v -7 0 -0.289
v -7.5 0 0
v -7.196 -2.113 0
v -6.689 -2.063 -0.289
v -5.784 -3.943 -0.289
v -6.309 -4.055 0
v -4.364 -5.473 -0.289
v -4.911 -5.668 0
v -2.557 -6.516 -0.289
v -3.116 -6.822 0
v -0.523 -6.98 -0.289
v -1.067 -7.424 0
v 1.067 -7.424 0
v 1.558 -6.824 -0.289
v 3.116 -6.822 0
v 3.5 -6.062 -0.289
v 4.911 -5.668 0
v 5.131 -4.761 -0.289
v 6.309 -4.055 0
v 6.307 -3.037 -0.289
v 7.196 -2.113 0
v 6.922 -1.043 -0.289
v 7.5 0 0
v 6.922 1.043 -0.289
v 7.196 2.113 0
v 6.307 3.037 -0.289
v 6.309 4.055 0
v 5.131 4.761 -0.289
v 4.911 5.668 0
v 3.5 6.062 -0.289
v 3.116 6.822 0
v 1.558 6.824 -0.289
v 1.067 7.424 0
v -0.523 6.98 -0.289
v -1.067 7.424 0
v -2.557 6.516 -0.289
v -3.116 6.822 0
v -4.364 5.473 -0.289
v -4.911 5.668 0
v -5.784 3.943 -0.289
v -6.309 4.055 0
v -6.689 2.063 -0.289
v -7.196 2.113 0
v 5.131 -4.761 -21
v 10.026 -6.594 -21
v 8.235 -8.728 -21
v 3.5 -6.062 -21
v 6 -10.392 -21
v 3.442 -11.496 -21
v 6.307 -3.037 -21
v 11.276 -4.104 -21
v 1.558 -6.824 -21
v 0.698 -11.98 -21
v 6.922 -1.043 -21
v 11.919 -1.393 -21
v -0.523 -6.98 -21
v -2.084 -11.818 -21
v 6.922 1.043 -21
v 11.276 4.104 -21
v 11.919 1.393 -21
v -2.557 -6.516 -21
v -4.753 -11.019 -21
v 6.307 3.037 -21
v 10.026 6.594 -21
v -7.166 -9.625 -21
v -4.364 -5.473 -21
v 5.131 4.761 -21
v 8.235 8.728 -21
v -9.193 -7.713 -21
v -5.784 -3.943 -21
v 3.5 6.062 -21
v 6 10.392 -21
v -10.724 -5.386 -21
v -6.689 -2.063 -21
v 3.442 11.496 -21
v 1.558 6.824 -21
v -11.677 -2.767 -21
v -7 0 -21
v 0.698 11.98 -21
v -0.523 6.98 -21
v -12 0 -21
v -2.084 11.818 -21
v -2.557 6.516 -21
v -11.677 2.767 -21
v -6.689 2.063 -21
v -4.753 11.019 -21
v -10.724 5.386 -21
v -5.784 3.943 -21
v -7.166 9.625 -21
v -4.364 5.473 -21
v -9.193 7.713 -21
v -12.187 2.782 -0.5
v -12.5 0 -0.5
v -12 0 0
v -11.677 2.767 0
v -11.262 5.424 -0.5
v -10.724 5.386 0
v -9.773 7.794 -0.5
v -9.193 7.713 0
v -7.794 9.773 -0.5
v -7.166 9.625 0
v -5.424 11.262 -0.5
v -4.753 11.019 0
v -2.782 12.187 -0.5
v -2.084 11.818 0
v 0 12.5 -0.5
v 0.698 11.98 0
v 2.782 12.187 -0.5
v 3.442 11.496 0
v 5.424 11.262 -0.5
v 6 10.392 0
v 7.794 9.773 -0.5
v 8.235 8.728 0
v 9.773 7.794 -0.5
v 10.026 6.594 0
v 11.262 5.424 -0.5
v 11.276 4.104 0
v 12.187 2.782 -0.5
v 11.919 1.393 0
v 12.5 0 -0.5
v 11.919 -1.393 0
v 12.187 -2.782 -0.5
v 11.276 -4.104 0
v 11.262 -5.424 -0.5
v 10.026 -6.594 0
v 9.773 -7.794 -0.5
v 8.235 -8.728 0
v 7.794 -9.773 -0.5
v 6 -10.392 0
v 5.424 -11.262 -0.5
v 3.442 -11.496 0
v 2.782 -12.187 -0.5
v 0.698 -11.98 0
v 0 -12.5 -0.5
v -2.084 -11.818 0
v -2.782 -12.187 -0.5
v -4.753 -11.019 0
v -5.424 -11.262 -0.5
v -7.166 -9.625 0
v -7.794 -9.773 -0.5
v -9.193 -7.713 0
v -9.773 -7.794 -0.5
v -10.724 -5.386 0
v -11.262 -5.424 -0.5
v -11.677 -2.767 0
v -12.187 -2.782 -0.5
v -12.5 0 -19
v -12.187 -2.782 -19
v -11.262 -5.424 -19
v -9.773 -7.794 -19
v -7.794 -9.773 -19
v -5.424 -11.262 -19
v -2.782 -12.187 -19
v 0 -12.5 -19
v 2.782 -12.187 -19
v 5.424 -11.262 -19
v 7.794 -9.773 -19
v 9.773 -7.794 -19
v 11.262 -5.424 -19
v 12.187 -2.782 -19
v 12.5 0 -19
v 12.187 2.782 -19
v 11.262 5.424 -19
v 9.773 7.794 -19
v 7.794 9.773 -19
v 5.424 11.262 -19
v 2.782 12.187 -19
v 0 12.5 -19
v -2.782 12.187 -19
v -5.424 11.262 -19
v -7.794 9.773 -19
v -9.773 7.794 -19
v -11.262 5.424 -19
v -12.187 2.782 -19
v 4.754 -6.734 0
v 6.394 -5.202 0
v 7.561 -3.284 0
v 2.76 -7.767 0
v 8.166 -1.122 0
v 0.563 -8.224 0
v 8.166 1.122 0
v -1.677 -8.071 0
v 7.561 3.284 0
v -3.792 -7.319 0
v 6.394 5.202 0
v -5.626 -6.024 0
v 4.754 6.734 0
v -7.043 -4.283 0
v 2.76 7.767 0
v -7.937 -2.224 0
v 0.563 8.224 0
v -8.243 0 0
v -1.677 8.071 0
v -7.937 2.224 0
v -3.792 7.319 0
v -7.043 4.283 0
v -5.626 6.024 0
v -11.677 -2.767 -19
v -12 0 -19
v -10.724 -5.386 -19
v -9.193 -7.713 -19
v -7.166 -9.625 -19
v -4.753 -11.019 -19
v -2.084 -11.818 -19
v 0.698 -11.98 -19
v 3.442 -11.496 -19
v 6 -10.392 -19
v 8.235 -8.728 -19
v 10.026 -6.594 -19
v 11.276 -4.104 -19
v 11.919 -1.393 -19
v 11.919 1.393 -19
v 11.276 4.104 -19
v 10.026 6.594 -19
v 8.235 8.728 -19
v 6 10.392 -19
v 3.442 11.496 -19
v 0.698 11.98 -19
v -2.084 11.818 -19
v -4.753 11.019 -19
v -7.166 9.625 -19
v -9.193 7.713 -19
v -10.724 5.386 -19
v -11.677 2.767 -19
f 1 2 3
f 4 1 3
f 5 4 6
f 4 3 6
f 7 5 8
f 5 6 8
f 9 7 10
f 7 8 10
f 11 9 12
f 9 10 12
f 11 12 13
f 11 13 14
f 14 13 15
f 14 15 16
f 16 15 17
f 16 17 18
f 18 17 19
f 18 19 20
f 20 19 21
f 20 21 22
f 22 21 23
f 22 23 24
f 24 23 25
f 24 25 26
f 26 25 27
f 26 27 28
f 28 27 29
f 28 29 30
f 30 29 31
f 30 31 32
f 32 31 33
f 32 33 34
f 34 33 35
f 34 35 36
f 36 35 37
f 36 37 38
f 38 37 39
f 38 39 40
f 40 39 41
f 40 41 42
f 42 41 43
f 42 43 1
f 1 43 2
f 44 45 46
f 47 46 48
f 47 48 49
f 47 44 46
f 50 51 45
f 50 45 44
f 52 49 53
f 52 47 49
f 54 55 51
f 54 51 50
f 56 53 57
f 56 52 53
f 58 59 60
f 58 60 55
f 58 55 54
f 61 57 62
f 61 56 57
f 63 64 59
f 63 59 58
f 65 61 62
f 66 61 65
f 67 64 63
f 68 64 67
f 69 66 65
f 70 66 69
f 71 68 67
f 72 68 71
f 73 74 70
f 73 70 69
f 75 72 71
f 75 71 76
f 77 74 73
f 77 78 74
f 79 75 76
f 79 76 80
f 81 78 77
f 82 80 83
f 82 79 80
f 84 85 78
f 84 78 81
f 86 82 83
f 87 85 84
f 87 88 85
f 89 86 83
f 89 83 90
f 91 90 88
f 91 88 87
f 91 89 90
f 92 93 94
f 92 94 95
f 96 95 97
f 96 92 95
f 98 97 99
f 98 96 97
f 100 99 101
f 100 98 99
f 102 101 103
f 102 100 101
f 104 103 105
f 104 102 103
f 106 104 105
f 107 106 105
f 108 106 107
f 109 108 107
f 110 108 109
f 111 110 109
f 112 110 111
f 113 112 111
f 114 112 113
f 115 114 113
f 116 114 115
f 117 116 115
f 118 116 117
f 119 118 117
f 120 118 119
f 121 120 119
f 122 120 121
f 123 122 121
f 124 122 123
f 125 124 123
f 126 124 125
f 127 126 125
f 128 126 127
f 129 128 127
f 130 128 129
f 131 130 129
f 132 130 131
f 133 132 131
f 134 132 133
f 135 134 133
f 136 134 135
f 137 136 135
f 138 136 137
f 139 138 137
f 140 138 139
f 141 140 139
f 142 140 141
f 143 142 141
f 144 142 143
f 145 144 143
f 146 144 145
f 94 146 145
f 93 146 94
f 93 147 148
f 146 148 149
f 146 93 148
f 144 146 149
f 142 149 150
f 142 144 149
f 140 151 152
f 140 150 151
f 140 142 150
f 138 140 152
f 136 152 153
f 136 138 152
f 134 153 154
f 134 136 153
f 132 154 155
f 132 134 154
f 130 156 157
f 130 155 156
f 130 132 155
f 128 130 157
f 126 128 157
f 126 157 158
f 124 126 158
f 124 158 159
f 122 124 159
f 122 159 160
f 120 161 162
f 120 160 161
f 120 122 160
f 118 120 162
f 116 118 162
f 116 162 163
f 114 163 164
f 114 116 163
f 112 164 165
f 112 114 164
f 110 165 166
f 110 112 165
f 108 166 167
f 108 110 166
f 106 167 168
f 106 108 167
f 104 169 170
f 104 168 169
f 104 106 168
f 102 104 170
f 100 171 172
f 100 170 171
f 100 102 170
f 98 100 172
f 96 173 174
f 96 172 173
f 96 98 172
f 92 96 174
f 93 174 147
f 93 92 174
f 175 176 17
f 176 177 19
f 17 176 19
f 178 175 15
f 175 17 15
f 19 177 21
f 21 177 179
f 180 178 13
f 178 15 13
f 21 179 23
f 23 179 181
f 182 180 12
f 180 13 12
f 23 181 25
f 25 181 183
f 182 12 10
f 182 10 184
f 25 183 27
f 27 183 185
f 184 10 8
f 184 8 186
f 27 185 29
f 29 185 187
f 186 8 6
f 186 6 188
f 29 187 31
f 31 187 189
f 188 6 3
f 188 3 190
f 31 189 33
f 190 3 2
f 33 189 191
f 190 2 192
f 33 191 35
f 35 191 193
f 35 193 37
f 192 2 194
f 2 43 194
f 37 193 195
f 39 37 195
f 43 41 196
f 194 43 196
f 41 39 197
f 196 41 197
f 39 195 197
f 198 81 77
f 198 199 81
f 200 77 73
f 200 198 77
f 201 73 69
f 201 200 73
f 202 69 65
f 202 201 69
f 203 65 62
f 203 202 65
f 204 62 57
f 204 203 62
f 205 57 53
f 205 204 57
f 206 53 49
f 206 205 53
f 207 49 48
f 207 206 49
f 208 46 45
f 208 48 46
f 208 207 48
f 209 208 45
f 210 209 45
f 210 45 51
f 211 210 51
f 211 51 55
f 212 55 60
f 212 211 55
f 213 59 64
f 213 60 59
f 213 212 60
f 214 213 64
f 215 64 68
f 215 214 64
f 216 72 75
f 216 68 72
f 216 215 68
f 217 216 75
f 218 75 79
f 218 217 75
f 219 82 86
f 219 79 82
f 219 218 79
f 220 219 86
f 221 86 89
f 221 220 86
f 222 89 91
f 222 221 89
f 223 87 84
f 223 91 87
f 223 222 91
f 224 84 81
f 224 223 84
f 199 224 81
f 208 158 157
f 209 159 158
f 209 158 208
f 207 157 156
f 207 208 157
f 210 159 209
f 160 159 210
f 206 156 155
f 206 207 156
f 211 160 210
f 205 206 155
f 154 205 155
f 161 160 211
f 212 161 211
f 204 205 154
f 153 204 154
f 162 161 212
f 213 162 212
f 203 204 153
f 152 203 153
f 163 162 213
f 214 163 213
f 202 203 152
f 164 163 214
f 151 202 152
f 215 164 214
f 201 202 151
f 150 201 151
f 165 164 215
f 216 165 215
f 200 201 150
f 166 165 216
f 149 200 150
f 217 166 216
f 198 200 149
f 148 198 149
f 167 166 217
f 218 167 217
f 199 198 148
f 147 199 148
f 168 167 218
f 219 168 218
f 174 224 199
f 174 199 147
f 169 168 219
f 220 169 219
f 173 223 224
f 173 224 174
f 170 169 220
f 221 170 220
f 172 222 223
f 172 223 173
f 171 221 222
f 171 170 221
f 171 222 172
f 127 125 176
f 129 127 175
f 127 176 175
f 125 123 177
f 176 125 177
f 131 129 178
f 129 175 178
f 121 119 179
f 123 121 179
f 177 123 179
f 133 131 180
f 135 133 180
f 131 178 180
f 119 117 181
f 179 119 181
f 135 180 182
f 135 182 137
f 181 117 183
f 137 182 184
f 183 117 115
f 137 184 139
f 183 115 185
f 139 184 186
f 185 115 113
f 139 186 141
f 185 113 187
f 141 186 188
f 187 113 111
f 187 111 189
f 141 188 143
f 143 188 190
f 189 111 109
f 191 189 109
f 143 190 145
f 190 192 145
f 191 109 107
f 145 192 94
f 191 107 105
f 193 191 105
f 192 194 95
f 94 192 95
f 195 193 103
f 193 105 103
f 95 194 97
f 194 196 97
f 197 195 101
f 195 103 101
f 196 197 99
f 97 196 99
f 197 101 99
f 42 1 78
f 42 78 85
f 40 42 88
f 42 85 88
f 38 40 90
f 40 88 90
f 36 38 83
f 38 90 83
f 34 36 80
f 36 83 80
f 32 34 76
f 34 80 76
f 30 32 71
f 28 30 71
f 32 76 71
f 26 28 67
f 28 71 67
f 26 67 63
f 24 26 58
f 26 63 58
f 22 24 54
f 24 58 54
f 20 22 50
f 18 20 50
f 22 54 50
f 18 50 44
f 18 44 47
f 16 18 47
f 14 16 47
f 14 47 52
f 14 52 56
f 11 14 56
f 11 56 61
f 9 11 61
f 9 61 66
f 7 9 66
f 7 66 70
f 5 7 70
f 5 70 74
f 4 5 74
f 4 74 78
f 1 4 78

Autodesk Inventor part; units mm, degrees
ref_plane "YZ Plane" through (0, 0, 0) normal (1, 0, 0) x (0, 1, 0)
ref_plane "XZ Plane" through (0, 0, 0) normal (0, 1, 0) x (-1, 0, 0)
ref_plane "XY Plane" through (0, 0, 0) normal (0, 0, 1) x (1, 0, 0)
sketch "Sketch1" plane through (0, 0, 0) normal (0, 1, 0) x (-1, 0, 0)
  line L0 (0, 0) -> (0, -21) construction
  line L1 (7, -21) -> (12, -21)
  line L2 (12, -21) -> (12, -19)
  line L3 (12, -19) -> (12.5, -19)
  line L4 (12.5, -19) -> (12.5, -0.5)
  line L5 (12.5, -0.5) -> (12, 0)
  line L6 (12, 0) -> (8.2431, 0)
  line L7 (7, -0.289) -> (7, -21)
  line L8 (8.2431, 0) -> (7.5, 0)
  line L9 (7, -0.289) -> (7.5, 0)
  point P0 (12, -20)
  dimension "d0" = 21
  dimension "d2" = 12
  dimension "d3" = 2
  dimension "d4" = 18.5
  dimension "d5" = 21
  dimension "d6" = 0
  dimension "d7" = 7.5
  dimension "d8" = 0.289
  dimension "d9" = 12.5
  dimension "d10" = 5.5
revolve "Revolution1" add sketch "Sketch1" angle 360 about axis through (0, 0, 0) along (0, 0, -1)
properties part number "26-10-209_ZI01"
